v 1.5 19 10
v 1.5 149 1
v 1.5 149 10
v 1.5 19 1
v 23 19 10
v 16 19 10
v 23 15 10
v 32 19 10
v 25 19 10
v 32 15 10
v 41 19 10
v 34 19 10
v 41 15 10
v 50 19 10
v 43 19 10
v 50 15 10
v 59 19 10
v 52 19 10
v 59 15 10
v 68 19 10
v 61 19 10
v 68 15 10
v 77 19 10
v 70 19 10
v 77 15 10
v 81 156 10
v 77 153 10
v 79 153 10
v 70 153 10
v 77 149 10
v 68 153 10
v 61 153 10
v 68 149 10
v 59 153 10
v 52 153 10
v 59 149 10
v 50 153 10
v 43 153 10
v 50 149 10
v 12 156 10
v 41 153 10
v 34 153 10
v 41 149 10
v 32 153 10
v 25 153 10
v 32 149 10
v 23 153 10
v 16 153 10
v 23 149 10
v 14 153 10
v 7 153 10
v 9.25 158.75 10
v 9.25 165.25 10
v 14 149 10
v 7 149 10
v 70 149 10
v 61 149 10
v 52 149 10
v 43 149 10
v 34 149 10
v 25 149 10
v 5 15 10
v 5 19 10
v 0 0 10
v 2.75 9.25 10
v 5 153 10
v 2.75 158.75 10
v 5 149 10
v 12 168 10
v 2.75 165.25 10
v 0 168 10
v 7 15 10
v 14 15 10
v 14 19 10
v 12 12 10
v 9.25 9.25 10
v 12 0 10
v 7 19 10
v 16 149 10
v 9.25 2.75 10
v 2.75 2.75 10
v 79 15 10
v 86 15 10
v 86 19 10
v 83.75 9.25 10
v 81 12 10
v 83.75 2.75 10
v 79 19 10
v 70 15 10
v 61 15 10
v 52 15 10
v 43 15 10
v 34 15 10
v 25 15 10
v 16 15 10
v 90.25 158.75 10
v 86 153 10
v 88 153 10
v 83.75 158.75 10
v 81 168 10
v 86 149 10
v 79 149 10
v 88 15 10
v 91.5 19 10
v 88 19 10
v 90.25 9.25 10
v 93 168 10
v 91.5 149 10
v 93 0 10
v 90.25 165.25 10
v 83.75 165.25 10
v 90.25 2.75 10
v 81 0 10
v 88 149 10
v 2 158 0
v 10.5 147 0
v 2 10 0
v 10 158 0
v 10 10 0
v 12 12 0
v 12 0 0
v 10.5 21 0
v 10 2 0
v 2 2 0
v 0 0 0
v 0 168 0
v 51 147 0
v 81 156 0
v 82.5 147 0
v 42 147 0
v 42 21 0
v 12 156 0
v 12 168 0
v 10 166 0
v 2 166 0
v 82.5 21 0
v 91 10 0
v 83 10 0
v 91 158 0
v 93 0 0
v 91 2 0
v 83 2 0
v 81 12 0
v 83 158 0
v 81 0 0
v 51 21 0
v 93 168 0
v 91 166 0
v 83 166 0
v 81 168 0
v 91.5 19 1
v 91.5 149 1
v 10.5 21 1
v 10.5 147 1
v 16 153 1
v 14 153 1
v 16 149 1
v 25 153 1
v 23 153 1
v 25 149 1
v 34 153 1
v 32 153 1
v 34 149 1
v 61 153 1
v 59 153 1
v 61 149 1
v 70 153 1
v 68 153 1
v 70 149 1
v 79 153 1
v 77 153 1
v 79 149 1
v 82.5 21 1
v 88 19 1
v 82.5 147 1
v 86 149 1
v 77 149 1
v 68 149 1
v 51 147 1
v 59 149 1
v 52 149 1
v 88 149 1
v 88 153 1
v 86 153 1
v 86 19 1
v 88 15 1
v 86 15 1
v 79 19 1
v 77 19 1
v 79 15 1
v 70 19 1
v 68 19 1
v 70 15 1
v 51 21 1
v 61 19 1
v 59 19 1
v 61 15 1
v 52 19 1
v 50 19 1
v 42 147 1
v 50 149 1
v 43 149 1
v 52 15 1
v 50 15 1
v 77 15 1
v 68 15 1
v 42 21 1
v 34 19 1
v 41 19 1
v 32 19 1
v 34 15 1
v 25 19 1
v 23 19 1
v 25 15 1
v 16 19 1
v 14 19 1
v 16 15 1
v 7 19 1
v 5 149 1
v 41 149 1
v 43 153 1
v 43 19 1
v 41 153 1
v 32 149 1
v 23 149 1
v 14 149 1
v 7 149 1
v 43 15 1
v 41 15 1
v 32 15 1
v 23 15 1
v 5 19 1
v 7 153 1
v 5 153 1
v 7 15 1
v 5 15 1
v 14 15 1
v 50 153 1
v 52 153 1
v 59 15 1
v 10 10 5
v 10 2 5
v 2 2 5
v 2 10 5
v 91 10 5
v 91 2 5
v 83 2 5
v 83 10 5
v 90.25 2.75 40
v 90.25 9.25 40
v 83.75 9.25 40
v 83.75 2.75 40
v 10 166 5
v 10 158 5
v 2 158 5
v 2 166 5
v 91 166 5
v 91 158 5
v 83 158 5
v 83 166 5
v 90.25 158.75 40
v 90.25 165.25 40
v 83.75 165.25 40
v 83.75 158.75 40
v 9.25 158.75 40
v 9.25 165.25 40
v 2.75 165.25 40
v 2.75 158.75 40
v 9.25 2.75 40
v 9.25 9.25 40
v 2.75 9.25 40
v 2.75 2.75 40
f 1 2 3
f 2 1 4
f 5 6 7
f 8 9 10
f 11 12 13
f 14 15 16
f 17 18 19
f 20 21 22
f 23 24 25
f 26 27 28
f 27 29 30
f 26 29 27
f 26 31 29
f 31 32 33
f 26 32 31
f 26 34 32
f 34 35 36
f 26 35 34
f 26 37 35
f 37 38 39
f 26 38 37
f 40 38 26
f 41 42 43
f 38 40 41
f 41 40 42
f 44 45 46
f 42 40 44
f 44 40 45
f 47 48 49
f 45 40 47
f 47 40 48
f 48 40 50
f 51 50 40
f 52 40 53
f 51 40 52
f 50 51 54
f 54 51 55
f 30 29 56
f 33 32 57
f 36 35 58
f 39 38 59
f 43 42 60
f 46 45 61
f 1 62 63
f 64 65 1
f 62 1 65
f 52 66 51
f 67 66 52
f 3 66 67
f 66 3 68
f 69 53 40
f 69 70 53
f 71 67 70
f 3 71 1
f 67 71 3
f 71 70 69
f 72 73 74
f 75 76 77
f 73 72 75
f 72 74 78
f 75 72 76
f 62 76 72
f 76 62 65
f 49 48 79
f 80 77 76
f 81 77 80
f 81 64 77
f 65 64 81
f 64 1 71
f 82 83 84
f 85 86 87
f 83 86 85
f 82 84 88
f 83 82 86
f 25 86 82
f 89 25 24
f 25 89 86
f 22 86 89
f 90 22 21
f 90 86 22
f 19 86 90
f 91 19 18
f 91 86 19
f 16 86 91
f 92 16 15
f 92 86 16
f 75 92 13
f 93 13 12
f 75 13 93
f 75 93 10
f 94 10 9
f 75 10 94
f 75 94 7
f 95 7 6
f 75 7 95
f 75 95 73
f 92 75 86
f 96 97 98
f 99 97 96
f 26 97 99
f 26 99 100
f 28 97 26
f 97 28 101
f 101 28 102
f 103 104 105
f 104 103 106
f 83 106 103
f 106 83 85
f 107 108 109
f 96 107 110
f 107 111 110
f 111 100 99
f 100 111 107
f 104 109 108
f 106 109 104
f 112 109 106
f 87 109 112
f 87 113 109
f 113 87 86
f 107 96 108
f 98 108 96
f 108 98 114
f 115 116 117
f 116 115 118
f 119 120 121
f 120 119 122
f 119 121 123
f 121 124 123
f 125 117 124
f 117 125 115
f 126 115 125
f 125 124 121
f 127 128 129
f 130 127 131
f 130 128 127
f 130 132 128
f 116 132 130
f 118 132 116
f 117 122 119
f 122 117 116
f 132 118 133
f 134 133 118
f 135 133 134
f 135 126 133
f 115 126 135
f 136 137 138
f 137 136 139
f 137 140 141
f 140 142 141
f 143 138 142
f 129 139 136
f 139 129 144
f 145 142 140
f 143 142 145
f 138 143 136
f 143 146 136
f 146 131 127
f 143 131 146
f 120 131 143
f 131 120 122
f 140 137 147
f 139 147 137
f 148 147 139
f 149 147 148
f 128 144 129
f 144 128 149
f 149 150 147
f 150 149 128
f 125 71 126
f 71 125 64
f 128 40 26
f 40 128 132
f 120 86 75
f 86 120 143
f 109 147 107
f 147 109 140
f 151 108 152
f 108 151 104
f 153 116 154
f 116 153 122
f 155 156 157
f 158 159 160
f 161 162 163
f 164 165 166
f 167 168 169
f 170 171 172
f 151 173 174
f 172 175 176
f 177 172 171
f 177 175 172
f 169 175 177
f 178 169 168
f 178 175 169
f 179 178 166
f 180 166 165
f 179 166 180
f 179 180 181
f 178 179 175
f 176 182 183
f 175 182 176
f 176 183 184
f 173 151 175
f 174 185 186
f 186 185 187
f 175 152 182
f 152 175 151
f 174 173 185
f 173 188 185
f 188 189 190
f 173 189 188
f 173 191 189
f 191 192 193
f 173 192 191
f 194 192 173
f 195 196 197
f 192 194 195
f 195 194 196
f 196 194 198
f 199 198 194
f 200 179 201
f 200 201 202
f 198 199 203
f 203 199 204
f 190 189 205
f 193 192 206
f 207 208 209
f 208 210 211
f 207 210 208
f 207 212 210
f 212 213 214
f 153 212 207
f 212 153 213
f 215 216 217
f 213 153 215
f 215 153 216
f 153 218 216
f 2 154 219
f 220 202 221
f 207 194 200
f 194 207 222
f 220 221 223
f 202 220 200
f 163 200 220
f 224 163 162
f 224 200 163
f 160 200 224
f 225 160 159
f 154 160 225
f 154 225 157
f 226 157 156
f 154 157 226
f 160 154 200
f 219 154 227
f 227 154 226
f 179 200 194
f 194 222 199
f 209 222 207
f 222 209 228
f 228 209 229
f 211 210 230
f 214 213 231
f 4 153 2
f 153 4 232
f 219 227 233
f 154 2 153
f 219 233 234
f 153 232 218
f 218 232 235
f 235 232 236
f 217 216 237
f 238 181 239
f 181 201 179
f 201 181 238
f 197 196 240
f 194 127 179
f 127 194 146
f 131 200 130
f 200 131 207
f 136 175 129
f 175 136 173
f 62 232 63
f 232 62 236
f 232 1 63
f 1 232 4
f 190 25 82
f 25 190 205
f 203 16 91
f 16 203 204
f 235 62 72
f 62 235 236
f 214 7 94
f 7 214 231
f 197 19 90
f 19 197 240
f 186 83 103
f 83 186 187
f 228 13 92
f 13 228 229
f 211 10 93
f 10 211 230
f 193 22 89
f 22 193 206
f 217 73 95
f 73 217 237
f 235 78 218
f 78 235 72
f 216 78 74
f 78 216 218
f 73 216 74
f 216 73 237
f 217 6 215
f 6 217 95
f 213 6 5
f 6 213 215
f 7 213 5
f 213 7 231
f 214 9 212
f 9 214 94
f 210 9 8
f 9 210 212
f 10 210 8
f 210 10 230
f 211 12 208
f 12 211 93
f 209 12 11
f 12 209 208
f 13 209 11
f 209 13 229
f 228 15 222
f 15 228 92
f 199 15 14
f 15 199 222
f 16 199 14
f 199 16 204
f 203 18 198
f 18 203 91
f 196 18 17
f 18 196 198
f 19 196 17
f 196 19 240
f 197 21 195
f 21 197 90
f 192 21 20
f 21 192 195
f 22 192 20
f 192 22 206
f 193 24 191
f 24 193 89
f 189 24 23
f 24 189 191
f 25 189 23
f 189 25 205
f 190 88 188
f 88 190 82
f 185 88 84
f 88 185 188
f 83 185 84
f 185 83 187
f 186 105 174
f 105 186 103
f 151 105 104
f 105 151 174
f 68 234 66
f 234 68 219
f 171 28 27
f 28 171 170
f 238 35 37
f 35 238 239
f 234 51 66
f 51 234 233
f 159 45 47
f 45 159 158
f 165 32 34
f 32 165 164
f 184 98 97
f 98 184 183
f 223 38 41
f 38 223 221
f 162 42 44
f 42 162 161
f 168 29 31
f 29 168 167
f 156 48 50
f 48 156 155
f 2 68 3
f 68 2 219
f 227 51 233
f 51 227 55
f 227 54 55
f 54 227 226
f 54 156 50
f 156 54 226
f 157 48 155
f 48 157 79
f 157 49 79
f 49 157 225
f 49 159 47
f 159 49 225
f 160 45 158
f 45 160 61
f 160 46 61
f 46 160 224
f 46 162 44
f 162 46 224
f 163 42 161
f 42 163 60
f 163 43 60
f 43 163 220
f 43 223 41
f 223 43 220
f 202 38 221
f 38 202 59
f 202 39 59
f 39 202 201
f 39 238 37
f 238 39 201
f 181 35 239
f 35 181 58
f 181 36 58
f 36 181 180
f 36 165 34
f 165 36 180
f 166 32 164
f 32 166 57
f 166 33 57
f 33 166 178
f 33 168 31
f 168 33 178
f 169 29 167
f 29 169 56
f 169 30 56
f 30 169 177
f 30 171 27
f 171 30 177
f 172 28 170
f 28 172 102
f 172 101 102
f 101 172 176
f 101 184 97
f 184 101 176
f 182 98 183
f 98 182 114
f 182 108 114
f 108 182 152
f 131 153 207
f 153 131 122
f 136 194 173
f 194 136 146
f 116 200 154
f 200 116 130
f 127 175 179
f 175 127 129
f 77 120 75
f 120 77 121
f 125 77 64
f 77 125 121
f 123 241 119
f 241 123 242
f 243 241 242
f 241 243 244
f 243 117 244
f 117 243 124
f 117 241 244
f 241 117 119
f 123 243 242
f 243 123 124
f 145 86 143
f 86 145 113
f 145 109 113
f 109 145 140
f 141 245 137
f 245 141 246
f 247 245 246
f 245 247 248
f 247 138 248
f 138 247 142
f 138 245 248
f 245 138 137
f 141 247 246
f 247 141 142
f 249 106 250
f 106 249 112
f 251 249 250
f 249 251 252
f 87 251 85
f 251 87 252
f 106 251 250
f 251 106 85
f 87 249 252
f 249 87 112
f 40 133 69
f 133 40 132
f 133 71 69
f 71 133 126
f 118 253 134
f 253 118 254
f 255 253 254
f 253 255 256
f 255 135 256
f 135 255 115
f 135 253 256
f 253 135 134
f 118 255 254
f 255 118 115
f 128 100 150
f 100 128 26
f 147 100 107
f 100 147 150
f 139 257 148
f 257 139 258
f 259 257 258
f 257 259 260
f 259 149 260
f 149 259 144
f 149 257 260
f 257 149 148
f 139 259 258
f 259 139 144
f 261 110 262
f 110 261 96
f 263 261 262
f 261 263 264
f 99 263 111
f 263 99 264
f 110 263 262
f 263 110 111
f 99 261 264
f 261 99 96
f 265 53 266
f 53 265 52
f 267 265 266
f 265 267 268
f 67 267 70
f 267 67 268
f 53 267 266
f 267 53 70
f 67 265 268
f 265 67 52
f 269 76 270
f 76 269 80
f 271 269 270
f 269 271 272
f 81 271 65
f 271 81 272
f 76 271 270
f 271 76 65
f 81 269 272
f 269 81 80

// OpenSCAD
// Memory Module Holder for 3D Printing
// memholder v2.1 - June 1, 2024
// CTCL 2022-2024
// -- LICENSE --
// To the extent possible under law, the author(s) have dedicated all copyright and related and neighboring rights to this software to the public domain worldwide. 
// This software is distributed without any warranty. You should have received a copy of the CC0 Public Domain Dedication along with this software. 
// If not, see <http://creativecommons.org/publicdomain/zero/1.0/>.

// == START CONFIGURATION SECTION ==
// All units are in mm unless otherwise specified

// -- Module parameters --

// How many modules
mem_count = 10; // [1:1:128]

// PRESETS - Predefined presets for different types of modules
// 0 - Standard DIMM with heatsink up to 9mm width and 136mm length
// 1 - Standard DIMM without heatsink up to 5mm width and 136mm length
// 2 - Standard SODIMM (laptop memory) without heatsink up to 5mm width and up to 70mm length
// 3 - Apple Mac Pro 1,1 large heatsink FBDIMM up to 25mm width and 136mm length
// 4 - MiniDIMM/MiniRDIMM up to 8mm width and 84mm length

mem_preset = 0; // [0: Standard DIMM (desktop memory), 1: Standard DIMM without heatsink, 2: Standard SODIMM (laptop memory) and UniDIMM, 3: Apple Mac Pro 1.1 FBDIMMs, 4: MiniDIMM/MiniRDIMM]
 
// Each list is in the order of [max pcb length, max module width, max pcb thickness]
mem_preset_defs = [[137, 9, 2], [137, 5, 2], [70, 5, 2], [137, 25, 2], [84, 7.6, 2]];
 
mem_pcb_length = mem_preset_defs[mem_preset][0];
mem_width_total = mem_preset_defs[mem_preset][1];
mem_pcb_width = mem_preset_defs[mem_preset][2];

// -- Base parameters --

// Width for walls on side of memory module
base_side_width = 4; // [1:0.2:6]
// Extra width for base under walls
base_side_ext = 2; // [0:0.2:6]
// Extra width of walls on the sides
base_side_width_ext = 3; // [1:0.2:6] 
// Height of walls for memory modules
base_side_height = 9; // [5:1:50]
// Base height - unit: mm
base_height = 1; // [1:0.1:3]
// Width of brace on the length side
base_length_brace_width = 1.5; // [1:0.1:4]
// Height of brace on the length side
base_length_brace_height = 10; // [1:0.1:20]

// -- Stack feature parameters --
// Enable posts for stacking memory holders
post_enable = true;
// Width to add around post
post_ext_wall = 2; // [1,0.1,5];
// Size of post
post_size_len = 8; // [1,0.1,10];
post_size_wid = 8; // [1,0.1,10];
// Base height of post
post_base_height = 35;
// Extending height of post
post_ext_height = 5;
// Size to remove from both length and width on the extending post to be able to fit
post_tolerance = 1.5;

post_ext_wall_height = 10;

// == END CONFIGURATION SECTION ==
// == START CALCULATION SECTION ==

// calculate from above to know how far to move the holder
post_total_len = post_size_len + (post_ext_wall * 2);
post_total_wid = post_size_wid + (post_ext_wall * 2);

// == END CALCULATION SECTION ==
// == START DRAWING SECTION

// Draw brace
// Module length side
translate([0, post_total_len, 0]) {
    cube([base_length_brace_width, mem_pcb_length + (base_side_width + base_side_width_ext), base_length_brace_height]);
    translate([(mem_width_total * mem_count) + base_length_brace_width, 0, 0]) {
        cube([base_length_brace_width, mem_pcb_length + (base_side_width + base_side_width_ext), base_length_brace_height]);
    }
}

// Draw memory holder
// Move everything else because of brace and posts if enabled
translate([base_length_brace_width, post_total_len, 0]) { 
    // No extra supports if memory module count is within 1 to 8
    if (mem_count > 0 && mem_count < 8) {
        for (a = [0 : 1 : 1]) {
            translate([((mem_width_total * mem_count) - mem_width_total) * a, 0, 0]) {
                cube([mem_width_total, mem_pcb_length + (base_side_width + base_side_width_ext), base_height]);
            }
        }
    }

    // Do not draw braces if the unit holds less than five modules
    if (mem_count > 5) {
        for (a = [0 : 1 : floor(mem_count / 8) + 1]) {
            translate([(((mem_width_total * mem_count) - mem_width_total) / (floor(mem_count / 6) + 1)) * a, 0, 0]) {
                cube([mem_width_total, mem_pcb_length + (base_side_width + base_side_width_ext), base_height]);
            }
        }
    }

    // Module width side
    cube([mem_width_total * mem_count, base_side_width + base_side_width_ext + base_side_ext, base_height]);

    translate([0, mem_pcb_length - base_side_ext, 0]) {
        cube([mem_width_total * mem_count, base_side_width + base_side_width_ext + base_side_ext, base_height]);
    }

    // Walls
    // Close side
    cube([(mem_width_total * mem_count), base_side_width_ext, base_height + base_side_height]);
    for (a = [0 : 1 : mem_count - 1]) {
        translate([(mem_width_total * a), base_side_width_ext, base_height]) {
            cube([(mem_width_total / 2) - (mem_pcb_width / 2) , base_side_width, base_side_height]);
            translate([mem_width_total / 2 + mem_pcb_width / 2,0,0]) {
                cube([(mem_width_total / 2) - (mem_pcb_width / 2) , base_side_width, base_side_height]);
            }
        }
    }

    // Far side
    translate([0, mem_pcb_length + base_side_width, 0]) {
        cube([(mem_width_total * mem_count), base_side_width_ext, base_height + base_side_height]);
    }
    for (a = [0 : 1 : mem_count - 1]) {
        translate([(mem_width_total * a), mem_pcb_length, base_height]) {
            cube([(mem_width_total / 2) - (mem_pcb_width / 2) , base_side_width, base_side_height]);
            translate([mem_width_total / 2 + mem_pcb_width / 2,0,0]) {
                cube([(mem_width_total / 2) - (mem_pcb_width / 2) , base_side_width, base_side_height]);
            }
        }
    }
}

// Draw posts
if (post_enable) {
     // Close side width, close side length
     difference() {
         cube([post_total_len, post_total_wid, post_ext_wall_height]);
         translate([post_ext_wall, post_ext_wall, 0]) {
             cube([post_size_len, post_size_wid, post_ext_height]);
         }
     }    
     translate([post_ext_wall + (post_tolerance / 2), post_ext_wall + (post_tolerance / 2), base_side_height]) {
         cube([post_size_len - post_tolerance, post_size_wid - post_tolerance, post_ext_height + (post_base_height - base_side_height)]);
     }
    
     translate([((mem_width_total * mem_count) + base_length_brace_width) - (post_total_wid - base_length_brace_width),0,0]) {
         difference() {
             cube([post_total_len, post_total_wid, post_ext_wall_height]);
             translate([post_ext_wall, post_ext_wall, 0]) {
                 cube([post_size_len, post_size_wid, post_ext_height]);
             }
         }    
         translate([post_ext_wall + (post_tolerance / 2), post_ext_wall + (post_tolerance / 2), post_ext_wall_height]) {
             cube([post_size_len - post_tolerance, post_size_wid - post_tolerance, post_ext_height + (post_base_height - post_ext_wall_height)]);
         }
     }
    
    translate([0,mem_pcb_length + post_total_len + base_side_width_ext + base_side_width,0]) {
        difference() {
            cube([post_total_len, post_total_wid, post_ext_wall_height]);
            translate([post_ext_wall, post_ext_wall, 0]) {
                cube([post_size_len, post_size_wid, post_ext_height]);
            }
        }    
        translate([post_ext_wall + (post_tolerance / 2), post_ext_wall + (post_tolerance / 2), post_ext_wall_height]) {
            cube([post_size_len - post_tolerance, post_size_wid - post_tolerance, post_ext_height + (post_base_height - post_ext_wall_height)]);
        }
        
        
        translate([((mem_width_total * mem_count) + base_length_brace_width) - (post_total_wid - base_length_brace_width),0,0]) {
            difference() {
                cube([post_total_len, post_total_wid, post_ext_wall_height]);
                translate([post_ext_wall, post_ext_wall, 0]) {
                    cube([post_size_len, post_size_wid, post_ext_height]);
                }
            }    
            translate([post_ext_wall + (post_tolerance / 2), post_ext_wall + (post_tolerance / 2), post_ext_wall_height]) {
                cube([post_size_len - post_tolerance, post_size_wid - post_tolerance, post_ext_height + (post_base_height - post_ext_wall_height)]);
            }
       }   
    }
}

// == END DRAWING SECTION ==
